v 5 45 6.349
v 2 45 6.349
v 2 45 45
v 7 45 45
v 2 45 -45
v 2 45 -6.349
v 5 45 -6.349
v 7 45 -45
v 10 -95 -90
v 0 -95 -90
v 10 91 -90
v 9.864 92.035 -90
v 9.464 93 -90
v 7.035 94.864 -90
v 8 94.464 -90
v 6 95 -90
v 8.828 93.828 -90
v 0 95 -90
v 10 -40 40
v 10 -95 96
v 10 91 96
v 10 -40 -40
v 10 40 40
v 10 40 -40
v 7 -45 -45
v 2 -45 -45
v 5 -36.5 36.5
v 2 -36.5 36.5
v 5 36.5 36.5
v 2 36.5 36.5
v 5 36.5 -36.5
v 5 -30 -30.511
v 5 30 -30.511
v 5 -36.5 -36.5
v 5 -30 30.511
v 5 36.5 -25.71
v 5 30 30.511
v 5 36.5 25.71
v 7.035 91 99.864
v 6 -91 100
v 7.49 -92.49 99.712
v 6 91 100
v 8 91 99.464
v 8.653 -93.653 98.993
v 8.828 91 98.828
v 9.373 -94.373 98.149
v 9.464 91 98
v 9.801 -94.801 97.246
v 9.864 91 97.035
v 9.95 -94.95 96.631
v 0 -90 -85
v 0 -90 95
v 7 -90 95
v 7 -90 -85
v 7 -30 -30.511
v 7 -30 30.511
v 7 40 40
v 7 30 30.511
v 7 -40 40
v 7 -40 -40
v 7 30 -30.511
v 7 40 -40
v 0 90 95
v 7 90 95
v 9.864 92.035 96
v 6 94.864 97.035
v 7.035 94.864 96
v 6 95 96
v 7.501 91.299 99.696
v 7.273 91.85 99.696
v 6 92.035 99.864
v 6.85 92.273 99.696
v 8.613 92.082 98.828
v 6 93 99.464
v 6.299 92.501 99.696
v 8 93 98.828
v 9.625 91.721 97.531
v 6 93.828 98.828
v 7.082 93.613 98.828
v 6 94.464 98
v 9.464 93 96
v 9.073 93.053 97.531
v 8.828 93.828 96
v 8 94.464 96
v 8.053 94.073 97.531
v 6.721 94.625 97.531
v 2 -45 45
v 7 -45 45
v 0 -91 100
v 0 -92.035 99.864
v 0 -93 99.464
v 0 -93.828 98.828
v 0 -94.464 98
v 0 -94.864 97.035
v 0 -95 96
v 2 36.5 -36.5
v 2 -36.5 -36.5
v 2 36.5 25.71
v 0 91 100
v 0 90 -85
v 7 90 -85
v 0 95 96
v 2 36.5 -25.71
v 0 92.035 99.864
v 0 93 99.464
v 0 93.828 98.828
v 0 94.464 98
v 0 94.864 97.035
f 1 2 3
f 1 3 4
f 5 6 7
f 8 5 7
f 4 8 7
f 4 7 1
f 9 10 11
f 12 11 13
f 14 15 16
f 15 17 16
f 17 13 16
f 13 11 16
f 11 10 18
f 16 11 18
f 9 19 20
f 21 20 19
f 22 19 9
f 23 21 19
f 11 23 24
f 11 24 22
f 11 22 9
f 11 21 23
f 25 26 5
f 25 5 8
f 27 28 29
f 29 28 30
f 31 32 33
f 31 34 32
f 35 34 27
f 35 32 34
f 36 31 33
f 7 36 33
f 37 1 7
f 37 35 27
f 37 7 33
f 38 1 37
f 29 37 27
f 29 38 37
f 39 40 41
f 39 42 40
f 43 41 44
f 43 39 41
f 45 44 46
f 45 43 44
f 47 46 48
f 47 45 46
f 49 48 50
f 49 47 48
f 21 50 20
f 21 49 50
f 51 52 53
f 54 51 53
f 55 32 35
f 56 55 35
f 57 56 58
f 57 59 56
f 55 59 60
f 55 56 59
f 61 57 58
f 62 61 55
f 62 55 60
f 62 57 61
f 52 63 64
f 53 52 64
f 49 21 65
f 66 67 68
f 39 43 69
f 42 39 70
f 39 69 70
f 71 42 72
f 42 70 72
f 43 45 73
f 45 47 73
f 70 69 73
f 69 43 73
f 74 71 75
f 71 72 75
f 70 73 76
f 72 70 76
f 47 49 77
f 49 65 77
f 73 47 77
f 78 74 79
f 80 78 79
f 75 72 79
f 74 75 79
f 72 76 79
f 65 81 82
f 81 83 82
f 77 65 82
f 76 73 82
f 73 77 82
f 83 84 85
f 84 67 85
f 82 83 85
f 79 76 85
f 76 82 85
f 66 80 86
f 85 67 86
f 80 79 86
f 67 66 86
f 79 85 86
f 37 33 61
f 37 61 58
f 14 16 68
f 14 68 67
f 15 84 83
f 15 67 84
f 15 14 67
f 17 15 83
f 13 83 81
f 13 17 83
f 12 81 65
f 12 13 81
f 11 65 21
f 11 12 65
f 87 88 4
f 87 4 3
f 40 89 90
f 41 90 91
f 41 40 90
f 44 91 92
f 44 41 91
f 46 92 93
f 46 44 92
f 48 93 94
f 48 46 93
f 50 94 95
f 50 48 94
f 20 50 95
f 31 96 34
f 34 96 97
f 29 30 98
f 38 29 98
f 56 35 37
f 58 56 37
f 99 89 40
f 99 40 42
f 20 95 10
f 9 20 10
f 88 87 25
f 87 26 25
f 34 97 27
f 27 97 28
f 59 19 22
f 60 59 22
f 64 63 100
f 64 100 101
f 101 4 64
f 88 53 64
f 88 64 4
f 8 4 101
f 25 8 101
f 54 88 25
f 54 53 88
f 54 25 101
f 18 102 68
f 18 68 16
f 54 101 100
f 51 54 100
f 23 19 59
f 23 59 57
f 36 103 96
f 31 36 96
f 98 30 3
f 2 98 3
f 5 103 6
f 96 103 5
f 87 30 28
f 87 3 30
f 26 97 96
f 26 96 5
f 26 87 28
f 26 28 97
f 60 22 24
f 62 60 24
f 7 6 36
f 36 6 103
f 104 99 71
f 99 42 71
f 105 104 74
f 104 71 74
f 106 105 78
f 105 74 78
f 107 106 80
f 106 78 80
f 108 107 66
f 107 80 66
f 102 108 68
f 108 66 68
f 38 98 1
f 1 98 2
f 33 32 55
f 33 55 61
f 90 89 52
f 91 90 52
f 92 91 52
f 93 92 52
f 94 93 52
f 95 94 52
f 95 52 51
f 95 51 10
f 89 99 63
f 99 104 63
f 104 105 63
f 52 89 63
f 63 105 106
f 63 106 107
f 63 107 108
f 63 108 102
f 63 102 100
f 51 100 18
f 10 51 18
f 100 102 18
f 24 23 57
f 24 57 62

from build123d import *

# Parameters (mm, degrees)
SKETCH1_W           = 190
SKETCH1_H           = 190
BOSS_EXTRUDE1_DEPTH = 10
CUT_EXTRUDE1_DEPTH  = 5
SKETCH3_W           = 61.021512422
SKETCH3_H           = 60
CUT_EXTRUDE2_DEPTH  = 139.021737418
SKETCH4_W           = 80
SKETCH4_H           = 80
CUT_EXTRUDE3_DEPTH  = 3
FILLET1_R           = 4
SHELL1_START        = -90
SHELL1_DEPTH        = 180
SHELL1_2_DEPTH      = 45
SHELL1_START_2      = 45
SHELL1_3_DEPTH      = 45


# Read off the part's stored shape, not the designer's step: Shell1
with BuildPart() as part:
    # Sketch1 → Boss-Extrude1 (new body)
    with BuildSketch(Plane(origin=(0, 0, 0), x_dir=(0, 0, -1), z_dir=(1, 0, 0))):
        with Locations((-5, 0)):
            Rectangle(SKETCH1_W, SKETCH1_H)
    extrude(amount=BOSS_EXTRUDE1_DEPTH)

    # Sketch2 → Cut-Extrude1 (cut)
    with BuildSketch(Plane.ZY):
        Polygon((36.5, -36.5), (36.5, 36.5), (25.709845909, 36.5), (5.209845909, 45.5), (-5.209845909, 45.5), (-25.709845909, 36.5), (-36.5, 36.5), (-36.5, -36.5), align=None)
    extrude(amount=-CUT_EXTRUDE1_DEPTH, mode=Mode.SUBTRACT)

    # Sketch3 → Cut-Extrude2 (cut, through all)
    with BuildSketch(Plane.ZY.offset(-5)):
        Rectangle(SKETCH3_W, SKETCH3_H)
    extrude(amount=-CUT_EXTRUDE2_DEPTH, mode=Mode.SUBTRACT)

    # Sketch4 → Cut-Extrude3 (cut)
    with BuildSketch(Plane(origin=(10, 0, 0), x_dir=(0, 0, -1), z_dir=(1, 0, 0))):
        Rectangle(SKETCH4_W, SKETCH4_H)
    extrude(amount=-CUT_EXTRUDE3_DEPTH, mode=Mode.SUBTRACT)

    # Fillet1
    fillet1_edges = [part.edges().sort_by_distance(p)[0] for p in [
        (10, 95, 5),
        (10, 0, 100),
        (5, 95, 100),
        (5, -95, 100),
    ]]
    fillet(fillet1_edges, radius=FILLET1_R)

    # Shell1 outline → Shell1 (cut)
    with BuildSketch(Plane(origin=(0, 0, 0), x_dir=(1, 0, 0), z_dir=(0, 1, 0)).offset(SHELL1_START)):
        Polygon((7, -45), (2, -45), (2, 45), (7, 45), (7, 85), (0, 85), (0, -95), (7, -95), align=None)
    extrude(amount=SHELL1_DEPTH, mode=Mode.SUBTRACT)

    # Shell1 2 outline → Shell1 2 (cut)
    with BuildSketch(Plane(origin=(0, 0, 0), x_dir=(1, 0, 0), z_dir=(0, 1, 0)).offset(SHELL1_START)):
        Polygon((2, -36.5), (2, -45), (7, -45), (7, 45), (2, 45), (2, 36.5), align=None)
    extrude(amount=SHELL1_2_DEPTH, mode=Mode.SUBTRACT)

    # Shell1 3 outline → Shell1 3 (cut)
    with BuildSketch(Plane(origin=(0, 0, 0), x_dir=(1, 0, 0), z_dir=(0, 1, 0)).offset(SHELL1_START_2)):
        Polygon((2, -36.5), (2, -45), (7, -45), (7, 45), (2, 45), (2, 36.5), align=None)
    extrude(amount=SHELL1_3_DEPTH, mode=Mode.SUBTRACT)


solid = part.part
